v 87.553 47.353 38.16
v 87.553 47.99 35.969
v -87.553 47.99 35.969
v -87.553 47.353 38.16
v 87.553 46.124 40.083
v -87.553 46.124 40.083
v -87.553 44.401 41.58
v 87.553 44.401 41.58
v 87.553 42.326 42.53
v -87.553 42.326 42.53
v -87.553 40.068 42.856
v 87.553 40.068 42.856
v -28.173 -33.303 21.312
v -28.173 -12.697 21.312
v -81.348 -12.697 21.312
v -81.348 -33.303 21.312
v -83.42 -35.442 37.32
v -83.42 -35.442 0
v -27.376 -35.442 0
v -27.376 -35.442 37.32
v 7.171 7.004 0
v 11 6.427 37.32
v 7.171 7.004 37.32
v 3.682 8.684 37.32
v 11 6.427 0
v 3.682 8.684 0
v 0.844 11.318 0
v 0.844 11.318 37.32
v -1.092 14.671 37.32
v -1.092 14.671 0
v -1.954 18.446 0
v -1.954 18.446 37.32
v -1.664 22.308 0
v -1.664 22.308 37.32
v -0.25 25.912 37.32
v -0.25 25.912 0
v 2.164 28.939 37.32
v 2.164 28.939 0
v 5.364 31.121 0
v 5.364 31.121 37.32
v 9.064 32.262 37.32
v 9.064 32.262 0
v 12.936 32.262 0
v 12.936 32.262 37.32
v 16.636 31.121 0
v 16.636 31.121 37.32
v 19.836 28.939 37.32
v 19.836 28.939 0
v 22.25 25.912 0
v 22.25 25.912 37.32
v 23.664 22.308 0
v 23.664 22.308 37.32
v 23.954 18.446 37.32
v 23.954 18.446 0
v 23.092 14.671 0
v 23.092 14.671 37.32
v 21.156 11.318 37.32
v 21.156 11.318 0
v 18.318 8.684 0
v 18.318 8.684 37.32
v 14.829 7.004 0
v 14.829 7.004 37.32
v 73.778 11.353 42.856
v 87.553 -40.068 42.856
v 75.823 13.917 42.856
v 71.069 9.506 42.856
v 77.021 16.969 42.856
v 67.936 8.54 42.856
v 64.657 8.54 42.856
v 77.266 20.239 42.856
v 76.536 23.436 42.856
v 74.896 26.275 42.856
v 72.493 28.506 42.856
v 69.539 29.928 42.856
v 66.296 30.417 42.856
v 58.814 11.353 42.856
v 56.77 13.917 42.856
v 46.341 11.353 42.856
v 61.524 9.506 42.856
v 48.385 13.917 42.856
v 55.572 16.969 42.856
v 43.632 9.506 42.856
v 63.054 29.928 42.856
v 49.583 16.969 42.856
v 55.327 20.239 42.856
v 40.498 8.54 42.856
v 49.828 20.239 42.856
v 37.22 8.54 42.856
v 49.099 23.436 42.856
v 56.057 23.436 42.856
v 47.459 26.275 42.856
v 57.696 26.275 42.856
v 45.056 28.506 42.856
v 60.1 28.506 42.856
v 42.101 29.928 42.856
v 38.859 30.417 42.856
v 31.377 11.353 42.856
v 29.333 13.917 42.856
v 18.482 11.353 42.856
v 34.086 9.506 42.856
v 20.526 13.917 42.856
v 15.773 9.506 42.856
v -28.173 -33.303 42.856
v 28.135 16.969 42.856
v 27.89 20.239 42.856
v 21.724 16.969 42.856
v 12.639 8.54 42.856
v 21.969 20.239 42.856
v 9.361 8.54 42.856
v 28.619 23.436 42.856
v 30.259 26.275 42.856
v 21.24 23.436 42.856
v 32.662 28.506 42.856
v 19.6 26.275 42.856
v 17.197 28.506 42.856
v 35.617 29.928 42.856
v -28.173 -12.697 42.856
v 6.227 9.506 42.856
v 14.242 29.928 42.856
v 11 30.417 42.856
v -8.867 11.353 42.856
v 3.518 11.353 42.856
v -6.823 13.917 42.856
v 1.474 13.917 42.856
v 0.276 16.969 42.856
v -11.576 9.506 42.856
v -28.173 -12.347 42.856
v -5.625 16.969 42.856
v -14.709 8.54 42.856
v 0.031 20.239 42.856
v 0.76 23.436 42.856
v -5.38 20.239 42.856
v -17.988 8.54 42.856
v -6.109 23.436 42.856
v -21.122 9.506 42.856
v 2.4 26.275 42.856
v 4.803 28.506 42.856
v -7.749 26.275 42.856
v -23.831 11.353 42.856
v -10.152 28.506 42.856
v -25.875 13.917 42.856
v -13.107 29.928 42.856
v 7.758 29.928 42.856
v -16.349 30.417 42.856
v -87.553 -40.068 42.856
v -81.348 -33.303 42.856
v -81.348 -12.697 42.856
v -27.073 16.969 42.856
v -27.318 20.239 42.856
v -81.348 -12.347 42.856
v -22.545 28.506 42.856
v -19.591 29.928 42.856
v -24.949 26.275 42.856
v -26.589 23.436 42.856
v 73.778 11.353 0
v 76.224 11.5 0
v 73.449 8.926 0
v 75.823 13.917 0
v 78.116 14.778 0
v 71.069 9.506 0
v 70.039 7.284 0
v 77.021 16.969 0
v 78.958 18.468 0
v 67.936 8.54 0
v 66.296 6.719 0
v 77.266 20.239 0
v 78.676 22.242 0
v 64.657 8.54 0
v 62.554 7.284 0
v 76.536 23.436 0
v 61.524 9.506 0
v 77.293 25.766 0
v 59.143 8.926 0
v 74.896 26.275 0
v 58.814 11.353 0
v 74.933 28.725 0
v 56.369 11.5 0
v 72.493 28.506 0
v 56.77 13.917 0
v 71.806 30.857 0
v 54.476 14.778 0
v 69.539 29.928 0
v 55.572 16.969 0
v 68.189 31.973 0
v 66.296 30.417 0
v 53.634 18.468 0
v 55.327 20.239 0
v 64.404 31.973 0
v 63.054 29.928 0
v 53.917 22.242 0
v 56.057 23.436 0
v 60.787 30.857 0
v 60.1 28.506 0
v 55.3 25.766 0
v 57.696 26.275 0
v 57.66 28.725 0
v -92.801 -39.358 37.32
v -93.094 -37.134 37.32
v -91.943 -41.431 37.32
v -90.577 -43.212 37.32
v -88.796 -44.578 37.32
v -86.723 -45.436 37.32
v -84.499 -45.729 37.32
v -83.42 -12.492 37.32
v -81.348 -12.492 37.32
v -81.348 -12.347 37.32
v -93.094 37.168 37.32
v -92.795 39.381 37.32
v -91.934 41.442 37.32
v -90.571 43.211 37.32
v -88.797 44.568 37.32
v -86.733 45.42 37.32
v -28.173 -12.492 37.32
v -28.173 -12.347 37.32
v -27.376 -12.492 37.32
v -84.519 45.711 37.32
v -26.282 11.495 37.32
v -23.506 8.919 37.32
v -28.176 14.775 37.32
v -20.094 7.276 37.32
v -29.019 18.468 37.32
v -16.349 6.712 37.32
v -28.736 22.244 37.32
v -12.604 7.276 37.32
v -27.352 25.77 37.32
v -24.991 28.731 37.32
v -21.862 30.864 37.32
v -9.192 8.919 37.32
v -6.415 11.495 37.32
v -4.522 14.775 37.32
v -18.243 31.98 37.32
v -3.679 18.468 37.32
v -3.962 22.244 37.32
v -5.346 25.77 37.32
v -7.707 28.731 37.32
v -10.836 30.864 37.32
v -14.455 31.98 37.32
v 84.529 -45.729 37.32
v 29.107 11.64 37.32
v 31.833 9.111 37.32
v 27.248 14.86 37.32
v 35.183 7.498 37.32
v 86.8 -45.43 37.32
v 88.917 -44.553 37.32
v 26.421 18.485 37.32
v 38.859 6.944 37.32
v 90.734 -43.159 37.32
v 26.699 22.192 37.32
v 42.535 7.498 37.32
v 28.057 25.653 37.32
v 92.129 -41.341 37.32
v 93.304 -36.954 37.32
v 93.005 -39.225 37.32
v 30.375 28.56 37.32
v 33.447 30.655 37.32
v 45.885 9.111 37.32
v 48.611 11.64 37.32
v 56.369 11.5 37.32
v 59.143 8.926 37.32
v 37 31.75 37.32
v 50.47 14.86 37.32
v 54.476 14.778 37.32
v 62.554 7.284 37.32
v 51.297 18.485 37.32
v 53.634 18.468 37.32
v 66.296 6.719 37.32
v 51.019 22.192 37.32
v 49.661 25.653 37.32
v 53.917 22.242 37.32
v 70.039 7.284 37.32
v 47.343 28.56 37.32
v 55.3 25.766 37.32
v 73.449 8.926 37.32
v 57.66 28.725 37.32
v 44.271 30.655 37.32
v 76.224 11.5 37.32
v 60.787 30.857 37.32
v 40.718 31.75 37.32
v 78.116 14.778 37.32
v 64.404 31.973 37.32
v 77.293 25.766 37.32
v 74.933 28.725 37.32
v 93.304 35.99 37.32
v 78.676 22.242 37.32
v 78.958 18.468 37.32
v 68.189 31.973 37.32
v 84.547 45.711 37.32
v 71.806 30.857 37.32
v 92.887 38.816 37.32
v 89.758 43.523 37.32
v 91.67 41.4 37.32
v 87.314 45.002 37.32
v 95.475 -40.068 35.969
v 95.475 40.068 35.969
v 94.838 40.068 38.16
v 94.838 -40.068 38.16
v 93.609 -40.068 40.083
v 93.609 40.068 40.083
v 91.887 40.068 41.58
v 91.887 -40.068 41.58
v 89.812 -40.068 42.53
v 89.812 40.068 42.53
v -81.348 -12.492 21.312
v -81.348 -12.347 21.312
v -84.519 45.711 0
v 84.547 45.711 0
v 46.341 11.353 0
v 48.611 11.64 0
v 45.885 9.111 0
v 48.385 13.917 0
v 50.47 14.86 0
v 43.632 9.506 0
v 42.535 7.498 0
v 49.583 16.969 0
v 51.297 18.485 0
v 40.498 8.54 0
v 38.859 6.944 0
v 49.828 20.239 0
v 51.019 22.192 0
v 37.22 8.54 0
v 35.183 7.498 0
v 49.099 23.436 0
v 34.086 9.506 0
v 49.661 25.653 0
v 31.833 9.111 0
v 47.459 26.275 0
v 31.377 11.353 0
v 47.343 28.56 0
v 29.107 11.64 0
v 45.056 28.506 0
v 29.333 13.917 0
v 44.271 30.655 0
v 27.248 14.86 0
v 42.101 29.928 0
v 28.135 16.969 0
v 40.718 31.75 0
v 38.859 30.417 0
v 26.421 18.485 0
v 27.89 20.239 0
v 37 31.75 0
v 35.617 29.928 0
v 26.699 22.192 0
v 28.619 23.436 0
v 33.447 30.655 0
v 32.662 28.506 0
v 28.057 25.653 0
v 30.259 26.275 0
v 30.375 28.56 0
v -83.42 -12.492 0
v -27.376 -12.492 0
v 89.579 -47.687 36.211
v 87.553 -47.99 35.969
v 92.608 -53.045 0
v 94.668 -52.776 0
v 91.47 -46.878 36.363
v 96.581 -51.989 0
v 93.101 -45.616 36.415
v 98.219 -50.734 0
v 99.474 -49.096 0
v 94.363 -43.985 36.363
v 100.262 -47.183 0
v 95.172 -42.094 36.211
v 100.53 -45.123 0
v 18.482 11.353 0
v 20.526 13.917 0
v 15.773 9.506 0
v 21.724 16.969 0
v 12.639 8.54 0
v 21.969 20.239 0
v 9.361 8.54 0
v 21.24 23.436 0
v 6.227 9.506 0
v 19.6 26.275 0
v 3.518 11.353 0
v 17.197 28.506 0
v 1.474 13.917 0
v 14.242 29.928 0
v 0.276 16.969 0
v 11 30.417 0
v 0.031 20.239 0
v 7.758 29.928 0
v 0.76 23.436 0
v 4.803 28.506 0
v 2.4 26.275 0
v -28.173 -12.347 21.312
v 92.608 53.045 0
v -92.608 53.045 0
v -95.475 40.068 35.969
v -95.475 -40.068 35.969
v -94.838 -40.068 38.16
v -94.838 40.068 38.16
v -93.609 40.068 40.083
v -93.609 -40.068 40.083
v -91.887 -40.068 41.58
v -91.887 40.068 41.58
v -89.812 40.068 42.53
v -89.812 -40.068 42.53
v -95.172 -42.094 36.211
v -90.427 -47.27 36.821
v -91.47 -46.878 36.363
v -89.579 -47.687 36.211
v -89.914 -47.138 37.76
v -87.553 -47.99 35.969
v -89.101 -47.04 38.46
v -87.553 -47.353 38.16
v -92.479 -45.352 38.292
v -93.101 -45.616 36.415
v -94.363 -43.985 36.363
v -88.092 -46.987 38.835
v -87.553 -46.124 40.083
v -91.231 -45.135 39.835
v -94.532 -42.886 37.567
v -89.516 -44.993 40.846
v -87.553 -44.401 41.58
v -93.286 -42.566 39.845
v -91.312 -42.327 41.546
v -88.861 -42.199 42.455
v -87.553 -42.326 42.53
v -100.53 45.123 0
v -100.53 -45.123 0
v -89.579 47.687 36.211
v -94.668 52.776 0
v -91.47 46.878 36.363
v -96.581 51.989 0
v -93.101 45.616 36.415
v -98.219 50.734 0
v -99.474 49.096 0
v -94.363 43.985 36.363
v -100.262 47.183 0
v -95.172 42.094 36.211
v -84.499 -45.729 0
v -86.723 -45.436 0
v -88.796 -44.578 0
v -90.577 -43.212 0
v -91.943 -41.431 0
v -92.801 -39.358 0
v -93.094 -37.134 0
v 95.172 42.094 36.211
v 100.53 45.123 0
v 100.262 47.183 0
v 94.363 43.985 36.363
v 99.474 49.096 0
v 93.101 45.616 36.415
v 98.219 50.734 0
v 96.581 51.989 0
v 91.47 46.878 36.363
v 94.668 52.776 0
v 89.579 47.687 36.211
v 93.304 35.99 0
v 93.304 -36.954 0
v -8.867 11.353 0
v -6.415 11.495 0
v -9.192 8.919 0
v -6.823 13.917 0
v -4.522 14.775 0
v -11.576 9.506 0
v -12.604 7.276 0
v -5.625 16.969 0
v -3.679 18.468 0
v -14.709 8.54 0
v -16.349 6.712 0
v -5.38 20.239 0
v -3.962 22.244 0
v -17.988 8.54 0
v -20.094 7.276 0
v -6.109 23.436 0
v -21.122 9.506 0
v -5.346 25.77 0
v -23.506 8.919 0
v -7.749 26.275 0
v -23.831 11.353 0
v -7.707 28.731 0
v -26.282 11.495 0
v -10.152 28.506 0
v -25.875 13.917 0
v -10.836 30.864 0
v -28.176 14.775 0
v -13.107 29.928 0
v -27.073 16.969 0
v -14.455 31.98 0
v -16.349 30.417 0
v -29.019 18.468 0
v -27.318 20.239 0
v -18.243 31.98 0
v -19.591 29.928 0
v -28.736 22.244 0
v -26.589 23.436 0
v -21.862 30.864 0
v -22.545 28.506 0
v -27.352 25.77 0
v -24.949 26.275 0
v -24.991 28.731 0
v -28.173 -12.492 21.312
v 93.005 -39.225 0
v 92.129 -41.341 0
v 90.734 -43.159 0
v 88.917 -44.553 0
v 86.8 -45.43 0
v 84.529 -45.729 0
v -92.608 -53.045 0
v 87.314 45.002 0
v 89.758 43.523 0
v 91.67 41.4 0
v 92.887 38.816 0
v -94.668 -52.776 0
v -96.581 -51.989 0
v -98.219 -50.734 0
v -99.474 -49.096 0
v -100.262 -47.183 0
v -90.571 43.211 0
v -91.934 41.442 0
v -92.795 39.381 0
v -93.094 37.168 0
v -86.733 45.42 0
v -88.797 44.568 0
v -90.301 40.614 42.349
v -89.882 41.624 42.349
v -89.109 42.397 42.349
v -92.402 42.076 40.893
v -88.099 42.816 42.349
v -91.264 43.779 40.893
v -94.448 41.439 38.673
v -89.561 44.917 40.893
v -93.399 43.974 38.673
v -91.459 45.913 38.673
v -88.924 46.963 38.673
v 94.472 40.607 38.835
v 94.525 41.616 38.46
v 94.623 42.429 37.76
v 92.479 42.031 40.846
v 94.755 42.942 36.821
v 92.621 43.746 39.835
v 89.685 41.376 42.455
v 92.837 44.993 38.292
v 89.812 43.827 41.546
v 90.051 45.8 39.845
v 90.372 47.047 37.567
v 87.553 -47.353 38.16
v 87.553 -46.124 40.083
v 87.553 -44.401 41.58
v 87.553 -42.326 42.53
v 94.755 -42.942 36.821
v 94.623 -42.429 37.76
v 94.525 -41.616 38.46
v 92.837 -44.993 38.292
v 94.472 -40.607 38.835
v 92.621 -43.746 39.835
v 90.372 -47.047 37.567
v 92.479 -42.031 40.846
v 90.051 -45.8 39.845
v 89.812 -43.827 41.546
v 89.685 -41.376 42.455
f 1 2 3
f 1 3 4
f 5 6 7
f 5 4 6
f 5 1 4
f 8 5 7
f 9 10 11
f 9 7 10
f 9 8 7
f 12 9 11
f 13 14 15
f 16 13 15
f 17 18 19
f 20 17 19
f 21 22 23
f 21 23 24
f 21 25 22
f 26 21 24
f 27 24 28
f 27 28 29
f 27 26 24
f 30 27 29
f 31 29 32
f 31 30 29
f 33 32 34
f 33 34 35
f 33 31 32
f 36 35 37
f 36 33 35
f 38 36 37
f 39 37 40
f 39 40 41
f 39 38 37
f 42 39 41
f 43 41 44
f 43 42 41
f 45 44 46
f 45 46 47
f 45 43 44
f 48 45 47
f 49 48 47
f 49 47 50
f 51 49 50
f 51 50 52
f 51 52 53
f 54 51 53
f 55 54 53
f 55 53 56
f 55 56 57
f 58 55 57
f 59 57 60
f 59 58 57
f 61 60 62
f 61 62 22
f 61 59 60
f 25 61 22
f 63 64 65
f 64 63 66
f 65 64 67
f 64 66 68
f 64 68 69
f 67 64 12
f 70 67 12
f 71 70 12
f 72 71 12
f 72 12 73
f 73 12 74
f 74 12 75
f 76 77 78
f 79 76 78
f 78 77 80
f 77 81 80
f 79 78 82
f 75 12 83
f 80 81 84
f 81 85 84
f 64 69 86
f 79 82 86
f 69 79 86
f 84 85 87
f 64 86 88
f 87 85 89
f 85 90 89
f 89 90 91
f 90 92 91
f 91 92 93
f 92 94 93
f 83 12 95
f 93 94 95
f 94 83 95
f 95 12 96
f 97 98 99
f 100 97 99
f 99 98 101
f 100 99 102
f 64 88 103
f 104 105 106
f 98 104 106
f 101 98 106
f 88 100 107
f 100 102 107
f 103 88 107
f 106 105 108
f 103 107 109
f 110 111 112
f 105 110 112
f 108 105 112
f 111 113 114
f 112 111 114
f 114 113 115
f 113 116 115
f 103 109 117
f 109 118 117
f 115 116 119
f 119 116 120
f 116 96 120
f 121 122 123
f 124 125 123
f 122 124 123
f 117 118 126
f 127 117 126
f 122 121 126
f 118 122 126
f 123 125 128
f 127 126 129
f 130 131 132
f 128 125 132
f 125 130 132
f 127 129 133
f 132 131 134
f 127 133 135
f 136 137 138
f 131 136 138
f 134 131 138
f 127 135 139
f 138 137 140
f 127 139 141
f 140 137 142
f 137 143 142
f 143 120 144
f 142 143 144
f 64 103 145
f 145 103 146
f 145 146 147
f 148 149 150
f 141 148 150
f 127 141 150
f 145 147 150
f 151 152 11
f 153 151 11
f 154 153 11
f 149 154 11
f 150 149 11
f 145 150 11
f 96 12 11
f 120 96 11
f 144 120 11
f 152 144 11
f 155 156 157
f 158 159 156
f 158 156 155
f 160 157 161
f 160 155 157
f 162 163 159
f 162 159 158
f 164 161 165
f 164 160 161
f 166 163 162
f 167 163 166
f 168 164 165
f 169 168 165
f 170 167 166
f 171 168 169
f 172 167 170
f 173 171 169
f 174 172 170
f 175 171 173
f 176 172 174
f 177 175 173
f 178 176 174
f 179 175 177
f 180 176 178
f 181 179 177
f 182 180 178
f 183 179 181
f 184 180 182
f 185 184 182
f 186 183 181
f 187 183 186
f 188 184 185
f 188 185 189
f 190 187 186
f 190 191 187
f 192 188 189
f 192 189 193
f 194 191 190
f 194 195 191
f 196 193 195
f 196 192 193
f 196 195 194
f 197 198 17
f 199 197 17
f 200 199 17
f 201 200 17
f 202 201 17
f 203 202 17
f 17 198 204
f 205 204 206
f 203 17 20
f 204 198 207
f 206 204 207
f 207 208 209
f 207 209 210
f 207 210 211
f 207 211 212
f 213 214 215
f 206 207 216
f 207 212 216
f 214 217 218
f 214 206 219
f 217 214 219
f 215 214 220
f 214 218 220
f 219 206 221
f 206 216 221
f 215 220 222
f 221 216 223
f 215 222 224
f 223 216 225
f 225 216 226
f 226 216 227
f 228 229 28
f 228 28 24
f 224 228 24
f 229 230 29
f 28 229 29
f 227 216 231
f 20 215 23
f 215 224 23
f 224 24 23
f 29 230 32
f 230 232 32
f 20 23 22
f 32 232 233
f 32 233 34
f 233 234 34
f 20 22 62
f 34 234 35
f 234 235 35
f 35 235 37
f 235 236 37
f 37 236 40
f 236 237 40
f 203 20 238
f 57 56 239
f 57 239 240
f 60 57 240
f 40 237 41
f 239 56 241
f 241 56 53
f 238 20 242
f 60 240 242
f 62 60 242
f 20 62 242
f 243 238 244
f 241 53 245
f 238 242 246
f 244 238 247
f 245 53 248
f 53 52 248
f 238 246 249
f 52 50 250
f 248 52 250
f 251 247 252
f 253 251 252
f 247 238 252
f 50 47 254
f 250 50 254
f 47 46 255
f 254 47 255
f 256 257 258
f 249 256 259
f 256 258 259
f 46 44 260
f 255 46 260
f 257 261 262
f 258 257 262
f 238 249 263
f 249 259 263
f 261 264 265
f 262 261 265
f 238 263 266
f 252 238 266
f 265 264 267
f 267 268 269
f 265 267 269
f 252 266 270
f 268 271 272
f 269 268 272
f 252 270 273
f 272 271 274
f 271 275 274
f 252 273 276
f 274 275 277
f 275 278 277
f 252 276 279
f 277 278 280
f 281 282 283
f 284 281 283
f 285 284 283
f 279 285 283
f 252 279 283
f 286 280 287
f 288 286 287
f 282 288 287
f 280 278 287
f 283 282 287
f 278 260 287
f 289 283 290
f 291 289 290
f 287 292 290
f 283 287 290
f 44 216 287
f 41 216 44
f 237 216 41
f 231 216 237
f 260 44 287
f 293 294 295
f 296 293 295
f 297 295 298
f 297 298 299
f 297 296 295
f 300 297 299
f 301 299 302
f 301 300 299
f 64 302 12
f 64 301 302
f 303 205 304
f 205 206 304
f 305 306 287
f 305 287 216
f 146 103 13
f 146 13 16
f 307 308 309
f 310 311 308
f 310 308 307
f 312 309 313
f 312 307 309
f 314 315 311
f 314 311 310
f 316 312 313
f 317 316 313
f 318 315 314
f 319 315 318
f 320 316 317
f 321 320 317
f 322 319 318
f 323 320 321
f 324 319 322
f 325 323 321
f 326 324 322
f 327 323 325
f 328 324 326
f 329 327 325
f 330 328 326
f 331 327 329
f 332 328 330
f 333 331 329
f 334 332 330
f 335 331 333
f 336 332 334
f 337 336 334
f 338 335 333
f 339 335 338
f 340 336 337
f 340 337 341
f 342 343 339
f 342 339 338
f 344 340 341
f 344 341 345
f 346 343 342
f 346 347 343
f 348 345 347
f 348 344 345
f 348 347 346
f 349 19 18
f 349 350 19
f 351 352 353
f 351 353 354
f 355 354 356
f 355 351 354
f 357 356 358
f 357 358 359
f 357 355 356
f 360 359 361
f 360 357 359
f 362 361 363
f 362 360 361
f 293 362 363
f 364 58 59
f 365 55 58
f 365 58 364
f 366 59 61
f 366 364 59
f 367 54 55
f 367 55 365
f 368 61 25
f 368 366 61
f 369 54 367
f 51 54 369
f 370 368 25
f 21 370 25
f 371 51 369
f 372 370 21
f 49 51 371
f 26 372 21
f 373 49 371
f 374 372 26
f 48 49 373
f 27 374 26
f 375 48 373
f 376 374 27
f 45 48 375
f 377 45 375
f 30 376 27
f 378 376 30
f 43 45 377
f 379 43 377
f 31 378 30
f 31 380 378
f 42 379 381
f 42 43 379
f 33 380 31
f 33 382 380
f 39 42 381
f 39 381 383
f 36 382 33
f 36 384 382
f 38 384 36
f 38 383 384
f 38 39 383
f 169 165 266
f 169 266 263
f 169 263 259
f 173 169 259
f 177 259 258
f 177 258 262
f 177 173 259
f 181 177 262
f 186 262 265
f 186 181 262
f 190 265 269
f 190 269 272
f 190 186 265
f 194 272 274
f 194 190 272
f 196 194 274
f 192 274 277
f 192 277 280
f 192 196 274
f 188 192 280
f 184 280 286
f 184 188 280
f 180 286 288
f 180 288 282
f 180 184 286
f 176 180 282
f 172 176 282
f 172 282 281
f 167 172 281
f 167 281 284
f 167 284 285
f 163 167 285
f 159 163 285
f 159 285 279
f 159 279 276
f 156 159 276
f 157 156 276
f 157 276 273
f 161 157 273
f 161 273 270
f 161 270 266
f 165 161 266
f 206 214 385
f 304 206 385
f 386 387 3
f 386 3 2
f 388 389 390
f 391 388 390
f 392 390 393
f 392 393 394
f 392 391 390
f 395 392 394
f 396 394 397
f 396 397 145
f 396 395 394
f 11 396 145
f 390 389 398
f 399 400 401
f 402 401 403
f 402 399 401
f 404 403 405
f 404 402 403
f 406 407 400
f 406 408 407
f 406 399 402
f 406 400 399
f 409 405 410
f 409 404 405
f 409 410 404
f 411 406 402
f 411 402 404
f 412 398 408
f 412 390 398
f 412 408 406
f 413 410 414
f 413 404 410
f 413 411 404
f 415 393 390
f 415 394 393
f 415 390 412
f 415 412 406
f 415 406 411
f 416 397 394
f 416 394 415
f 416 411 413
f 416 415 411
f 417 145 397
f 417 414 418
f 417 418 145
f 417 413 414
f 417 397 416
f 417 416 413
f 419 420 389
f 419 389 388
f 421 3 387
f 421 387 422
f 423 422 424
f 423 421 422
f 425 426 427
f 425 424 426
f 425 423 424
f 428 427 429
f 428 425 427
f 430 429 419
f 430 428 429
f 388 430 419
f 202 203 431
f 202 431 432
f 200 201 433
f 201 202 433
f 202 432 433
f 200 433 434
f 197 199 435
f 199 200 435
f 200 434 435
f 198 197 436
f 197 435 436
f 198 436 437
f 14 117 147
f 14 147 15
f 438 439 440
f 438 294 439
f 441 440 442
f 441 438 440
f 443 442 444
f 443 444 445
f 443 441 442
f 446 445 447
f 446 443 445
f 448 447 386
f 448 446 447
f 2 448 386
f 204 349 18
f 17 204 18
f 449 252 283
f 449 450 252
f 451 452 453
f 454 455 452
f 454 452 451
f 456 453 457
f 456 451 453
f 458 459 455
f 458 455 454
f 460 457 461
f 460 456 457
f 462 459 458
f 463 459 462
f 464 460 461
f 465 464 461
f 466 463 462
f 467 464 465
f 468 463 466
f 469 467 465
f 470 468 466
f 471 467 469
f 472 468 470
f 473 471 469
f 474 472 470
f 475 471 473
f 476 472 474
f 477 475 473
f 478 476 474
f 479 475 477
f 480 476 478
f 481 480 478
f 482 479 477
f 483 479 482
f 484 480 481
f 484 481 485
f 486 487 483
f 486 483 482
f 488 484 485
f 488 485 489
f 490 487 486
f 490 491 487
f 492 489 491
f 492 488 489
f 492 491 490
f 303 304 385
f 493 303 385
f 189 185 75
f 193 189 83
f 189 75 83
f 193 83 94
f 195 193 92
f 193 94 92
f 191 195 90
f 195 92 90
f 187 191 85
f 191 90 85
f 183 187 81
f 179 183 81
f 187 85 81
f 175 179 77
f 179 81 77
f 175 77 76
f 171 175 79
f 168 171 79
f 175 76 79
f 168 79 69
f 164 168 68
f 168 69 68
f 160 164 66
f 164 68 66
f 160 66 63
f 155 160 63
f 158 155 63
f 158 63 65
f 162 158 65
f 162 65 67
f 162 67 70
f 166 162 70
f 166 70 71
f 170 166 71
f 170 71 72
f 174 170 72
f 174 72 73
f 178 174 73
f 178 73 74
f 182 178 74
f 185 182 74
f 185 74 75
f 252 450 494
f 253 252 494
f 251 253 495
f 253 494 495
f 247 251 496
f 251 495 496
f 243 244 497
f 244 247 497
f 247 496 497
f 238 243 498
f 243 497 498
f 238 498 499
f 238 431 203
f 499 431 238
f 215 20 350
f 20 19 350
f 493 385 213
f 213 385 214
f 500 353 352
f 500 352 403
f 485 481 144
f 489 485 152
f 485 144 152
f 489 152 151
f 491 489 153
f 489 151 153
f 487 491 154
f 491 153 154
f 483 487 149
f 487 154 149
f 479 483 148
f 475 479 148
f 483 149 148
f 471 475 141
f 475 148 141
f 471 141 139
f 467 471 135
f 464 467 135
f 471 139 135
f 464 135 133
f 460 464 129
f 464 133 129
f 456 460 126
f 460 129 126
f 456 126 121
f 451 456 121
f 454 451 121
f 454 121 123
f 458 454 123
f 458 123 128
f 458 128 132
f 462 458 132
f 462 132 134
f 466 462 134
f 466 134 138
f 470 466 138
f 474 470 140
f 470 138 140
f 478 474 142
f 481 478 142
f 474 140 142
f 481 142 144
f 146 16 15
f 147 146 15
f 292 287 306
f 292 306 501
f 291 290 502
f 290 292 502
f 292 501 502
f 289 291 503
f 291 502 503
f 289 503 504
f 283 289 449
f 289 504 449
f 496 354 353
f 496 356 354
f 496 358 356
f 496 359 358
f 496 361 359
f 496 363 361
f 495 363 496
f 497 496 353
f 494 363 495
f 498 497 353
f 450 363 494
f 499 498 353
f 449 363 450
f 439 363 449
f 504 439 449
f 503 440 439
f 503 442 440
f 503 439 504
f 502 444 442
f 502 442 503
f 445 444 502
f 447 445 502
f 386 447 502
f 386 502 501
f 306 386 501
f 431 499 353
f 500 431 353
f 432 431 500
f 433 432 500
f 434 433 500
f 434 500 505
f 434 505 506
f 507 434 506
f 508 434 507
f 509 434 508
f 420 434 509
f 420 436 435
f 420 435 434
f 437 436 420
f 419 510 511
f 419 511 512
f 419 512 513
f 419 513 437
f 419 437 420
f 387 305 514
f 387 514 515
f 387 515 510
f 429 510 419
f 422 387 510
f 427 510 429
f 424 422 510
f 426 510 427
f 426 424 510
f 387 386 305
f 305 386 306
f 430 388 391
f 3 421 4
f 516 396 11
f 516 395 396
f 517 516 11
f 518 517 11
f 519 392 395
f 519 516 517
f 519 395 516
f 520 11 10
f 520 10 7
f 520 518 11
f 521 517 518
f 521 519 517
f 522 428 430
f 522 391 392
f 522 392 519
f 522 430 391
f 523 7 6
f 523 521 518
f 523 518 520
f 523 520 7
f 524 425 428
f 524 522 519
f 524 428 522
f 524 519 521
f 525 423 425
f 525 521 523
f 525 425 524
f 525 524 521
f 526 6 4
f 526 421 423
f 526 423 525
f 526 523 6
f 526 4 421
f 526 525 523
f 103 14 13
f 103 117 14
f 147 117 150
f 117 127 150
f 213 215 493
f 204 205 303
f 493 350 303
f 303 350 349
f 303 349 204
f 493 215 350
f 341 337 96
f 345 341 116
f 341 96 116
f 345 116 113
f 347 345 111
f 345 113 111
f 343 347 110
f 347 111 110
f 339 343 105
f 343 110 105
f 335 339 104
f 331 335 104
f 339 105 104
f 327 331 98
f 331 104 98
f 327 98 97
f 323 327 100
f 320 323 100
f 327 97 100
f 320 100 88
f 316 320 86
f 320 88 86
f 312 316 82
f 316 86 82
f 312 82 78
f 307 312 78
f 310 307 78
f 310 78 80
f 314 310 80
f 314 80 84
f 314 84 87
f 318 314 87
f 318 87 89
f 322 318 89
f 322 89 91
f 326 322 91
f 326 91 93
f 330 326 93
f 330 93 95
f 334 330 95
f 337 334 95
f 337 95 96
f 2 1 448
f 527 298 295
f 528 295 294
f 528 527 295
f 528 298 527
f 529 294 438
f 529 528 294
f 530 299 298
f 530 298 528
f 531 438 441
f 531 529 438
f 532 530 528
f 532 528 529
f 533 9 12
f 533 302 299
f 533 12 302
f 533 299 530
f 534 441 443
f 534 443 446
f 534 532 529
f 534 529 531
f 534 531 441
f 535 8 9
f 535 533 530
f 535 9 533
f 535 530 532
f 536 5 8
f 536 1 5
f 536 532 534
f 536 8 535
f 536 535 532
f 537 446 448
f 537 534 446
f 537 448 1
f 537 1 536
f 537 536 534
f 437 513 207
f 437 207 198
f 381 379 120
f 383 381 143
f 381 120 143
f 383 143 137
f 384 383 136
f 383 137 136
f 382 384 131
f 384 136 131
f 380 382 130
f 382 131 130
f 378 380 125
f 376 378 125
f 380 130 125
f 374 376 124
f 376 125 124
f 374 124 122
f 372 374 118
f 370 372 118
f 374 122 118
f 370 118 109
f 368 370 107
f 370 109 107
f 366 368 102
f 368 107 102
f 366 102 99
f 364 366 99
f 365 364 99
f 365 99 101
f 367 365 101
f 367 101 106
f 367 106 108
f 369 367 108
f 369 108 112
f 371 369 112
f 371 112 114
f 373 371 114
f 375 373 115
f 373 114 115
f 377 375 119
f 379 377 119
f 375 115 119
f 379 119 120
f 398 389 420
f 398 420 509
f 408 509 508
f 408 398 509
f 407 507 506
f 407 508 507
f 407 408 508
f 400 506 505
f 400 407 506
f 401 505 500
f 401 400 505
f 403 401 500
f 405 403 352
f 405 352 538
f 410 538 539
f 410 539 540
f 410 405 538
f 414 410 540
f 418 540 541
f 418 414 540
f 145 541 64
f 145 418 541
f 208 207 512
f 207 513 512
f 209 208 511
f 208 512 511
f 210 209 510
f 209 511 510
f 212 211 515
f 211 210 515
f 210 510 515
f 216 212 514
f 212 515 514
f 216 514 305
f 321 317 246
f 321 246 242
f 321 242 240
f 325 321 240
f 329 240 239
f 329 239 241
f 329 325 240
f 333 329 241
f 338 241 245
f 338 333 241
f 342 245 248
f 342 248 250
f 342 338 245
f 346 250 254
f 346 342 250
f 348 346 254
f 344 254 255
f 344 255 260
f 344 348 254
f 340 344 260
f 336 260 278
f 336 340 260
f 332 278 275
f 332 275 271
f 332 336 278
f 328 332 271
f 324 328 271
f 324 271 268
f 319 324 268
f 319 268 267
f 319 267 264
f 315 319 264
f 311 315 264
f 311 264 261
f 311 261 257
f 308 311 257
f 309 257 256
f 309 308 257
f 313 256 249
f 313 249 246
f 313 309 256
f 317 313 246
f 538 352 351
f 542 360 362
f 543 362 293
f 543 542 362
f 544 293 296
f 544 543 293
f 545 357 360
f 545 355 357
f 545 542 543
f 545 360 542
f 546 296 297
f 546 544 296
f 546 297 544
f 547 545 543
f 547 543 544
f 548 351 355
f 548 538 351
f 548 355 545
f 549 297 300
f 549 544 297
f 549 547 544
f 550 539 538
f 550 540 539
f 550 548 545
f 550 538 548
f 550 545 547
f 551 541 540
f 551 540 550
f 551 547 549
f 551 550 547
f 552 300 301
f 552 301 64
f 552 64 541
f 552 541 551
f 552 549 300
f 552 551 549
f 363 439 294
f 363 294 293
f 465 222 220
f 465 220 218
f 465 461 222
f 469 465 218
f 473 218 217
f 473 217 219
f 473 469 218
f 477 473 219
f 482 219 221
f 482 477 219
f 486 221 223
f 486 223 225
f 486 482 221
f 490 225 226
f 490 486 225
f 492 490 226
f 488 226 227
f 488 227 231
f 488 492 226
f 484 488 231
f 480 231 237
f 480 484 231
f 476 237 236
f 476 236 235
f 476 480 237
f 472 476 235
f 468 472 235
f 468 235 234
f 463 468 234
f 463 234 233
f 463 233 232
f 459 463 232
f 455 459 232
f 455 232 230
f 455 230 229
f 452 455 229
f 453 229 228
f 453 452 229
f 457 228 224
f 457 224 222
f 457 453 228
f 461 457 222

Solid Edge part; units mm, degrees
sketch "Sketch1" plane through (0, 0, 0) normal (0, 0, 1) x (1, 0, 0)
  line L0 (94.5072, -47.022) -> (-94.5072, -47.022)
  line L1 (-94.5072, -47.022) -> (-94.5072, 47.022)
  line L2 (-94.5072, 47.022) -> (94.5072, 47.022)
  line L3 (94.5072, 47.022) -> (94.5072, -47.022)
extrude "Protrusion1" add sketch "Sketch1" along normal blind 42.8556
sketch "Sketch2" plane through (0, 0, 42.8556) normal (0, 0, 1) x (0, 1, 0)
  line L0 (-12.3474, 81.3483) -> (-12.3474, 28.1728)
  line L1 (-12.3474, 28.1728) -> (-33.3033, 28.1728)
  line L2 (-33.3033, 28.1728) -> (-33.3033, 81.3483)
  line L3 (-33.3033, 81.3483) -> (-12.3474, 81.3483)
extrude "ExtrudedCutout_1" cut sketch "Sketch2" against normal blind 21.544
sketch "Sketch3" plane through (0, 0, 42.8556) normal (0, 0, 1) x (0, 1, 0)
  circle A0 centre (19.417, 16.3489) radius 11
  circle A1 centre (19.417, -11) radius 11
  circle A2 centre (19.417, -38.859) radius 11
  circle A3 centre (19.417, -66.2963) radius 11
extrude "ExtrudedCutout_2" cut sketch "Sketch3" against normal blind 103.4341
sketch "Sketch4" plane through (0, 0, 0) normal (0, 0, -1) x (0, -1, 0)
  line L0 (12.4915, 83.4201) -> (35.4423, 83.4201)
  line L1 (35.4423, 83.4201) -> (35.4423, 27.3756)
  line L2 (35.4423, 27.3756) -> (12.4915, 27.3756)
  line L3 (12.4915, 27.3756) -> (12.4915, 83.4201)
  circle A0 centre (-19.417, 16.3489) radius 12.7054
  circle A1 centre (-19.417, -11) radius 12.9901
  circle A2 centre (-19.417, -38.859) radius 12.4728
  circle A3 centre (-19.417, -66.2963) radius 12.6976
  line L4 (-37.1683, 93.0942) -> (37.1336, 93.0942)
  arc A4 (37.1336, 93.0942) -> (45.7291, 84.4987) centre (37.1336, 84.4987) cw
  line L5 (45.7291, 84.4987) -> (45.7291, -84.529)
  arc A5 (45.7291, -84.529) -> (36.9537, -93.3044) centre (36.9537, -84.529) cw
  line L6 (36.9537, -93.3044) -> (-35.9897, -93.3044)
  arc A6 (-35.9897, -93.3044) -> (-45.711, -84.5471) centre (-35.9897, -83.53) cw
  line L7 (-45.711, -84.5471) -> (-45.711, 84.5189)
  arc A7 (-45.711, 84.5189) -> (-37.1683, 93.0942) centre (-37.1357, 84.5189) cw
extrude "Cutout_3" cut sketch "Sketch4" against normal blind 37.32
sketch "Sketch5" plane through (-55.3979, -12.4915, 18.6615) normal (0, 1, 0) x (-1, 0, 0)
  line L0 (-27.2251, 18.6585) -> (25.9504, 18.6585)
  line L1 (25.9504, 18.6585) -> (25.9504, 2.6501)
  line L2 (25.9504, 2.6501) -> (-27.2251, 2.6501)
  line L3 (-27.2251, 2.6501) -> (-27.2251, 18.6585)
extrude "ExtrudedProtrusion_2" add sketch "Sketch5" against normal blind 0.0041
sketch "Sketch6" plane through (-54.7605, -12.3474, 40.0894) normal (0, -1, 0) x (-1, 0, 0)
  line L0 (-26.5878, -2.7663) -> (26.5878, -2.7663)
  line L1 (26.5878, -2.7663) -> (26.5878, 18.7777)
  line L2 (26.5878, 18.7777) -> (-26.5878, 18.7777)
  line L3 (-26.5878, 18.7777) -> (-26.5878, -2.7663)
extrude "ExtrudedProtrusion_3" add sketch "Sketch6" along normal blind 0.35
draft "Draft_7" angle 8 neutral plane through (0, 0, 42.8556) normal (0, 0, 1) pull direction (0, 0, 1) face at (94.5072, 32.2884, 35.2844) face at (-64.8949, 47.022, 35.2844) face at (-94.5072, -32.2884, 35.2844) face at (64.8949, -47.022, 35.2844)
fillet "Round_1" radius 8 8 edges at (-97.5187, 50.0335, 21.4278) (-94.5072, 0, 42.8556) (0, 47.022, 42.8556) (-97.5187, -50.0335, 21.4278) (0, -47.022, 42.8556) (97.5187, -50.0335, 21.4278) (94.5072, 0, 42.8556) (97.5187, 50.0335, 21.4278)
